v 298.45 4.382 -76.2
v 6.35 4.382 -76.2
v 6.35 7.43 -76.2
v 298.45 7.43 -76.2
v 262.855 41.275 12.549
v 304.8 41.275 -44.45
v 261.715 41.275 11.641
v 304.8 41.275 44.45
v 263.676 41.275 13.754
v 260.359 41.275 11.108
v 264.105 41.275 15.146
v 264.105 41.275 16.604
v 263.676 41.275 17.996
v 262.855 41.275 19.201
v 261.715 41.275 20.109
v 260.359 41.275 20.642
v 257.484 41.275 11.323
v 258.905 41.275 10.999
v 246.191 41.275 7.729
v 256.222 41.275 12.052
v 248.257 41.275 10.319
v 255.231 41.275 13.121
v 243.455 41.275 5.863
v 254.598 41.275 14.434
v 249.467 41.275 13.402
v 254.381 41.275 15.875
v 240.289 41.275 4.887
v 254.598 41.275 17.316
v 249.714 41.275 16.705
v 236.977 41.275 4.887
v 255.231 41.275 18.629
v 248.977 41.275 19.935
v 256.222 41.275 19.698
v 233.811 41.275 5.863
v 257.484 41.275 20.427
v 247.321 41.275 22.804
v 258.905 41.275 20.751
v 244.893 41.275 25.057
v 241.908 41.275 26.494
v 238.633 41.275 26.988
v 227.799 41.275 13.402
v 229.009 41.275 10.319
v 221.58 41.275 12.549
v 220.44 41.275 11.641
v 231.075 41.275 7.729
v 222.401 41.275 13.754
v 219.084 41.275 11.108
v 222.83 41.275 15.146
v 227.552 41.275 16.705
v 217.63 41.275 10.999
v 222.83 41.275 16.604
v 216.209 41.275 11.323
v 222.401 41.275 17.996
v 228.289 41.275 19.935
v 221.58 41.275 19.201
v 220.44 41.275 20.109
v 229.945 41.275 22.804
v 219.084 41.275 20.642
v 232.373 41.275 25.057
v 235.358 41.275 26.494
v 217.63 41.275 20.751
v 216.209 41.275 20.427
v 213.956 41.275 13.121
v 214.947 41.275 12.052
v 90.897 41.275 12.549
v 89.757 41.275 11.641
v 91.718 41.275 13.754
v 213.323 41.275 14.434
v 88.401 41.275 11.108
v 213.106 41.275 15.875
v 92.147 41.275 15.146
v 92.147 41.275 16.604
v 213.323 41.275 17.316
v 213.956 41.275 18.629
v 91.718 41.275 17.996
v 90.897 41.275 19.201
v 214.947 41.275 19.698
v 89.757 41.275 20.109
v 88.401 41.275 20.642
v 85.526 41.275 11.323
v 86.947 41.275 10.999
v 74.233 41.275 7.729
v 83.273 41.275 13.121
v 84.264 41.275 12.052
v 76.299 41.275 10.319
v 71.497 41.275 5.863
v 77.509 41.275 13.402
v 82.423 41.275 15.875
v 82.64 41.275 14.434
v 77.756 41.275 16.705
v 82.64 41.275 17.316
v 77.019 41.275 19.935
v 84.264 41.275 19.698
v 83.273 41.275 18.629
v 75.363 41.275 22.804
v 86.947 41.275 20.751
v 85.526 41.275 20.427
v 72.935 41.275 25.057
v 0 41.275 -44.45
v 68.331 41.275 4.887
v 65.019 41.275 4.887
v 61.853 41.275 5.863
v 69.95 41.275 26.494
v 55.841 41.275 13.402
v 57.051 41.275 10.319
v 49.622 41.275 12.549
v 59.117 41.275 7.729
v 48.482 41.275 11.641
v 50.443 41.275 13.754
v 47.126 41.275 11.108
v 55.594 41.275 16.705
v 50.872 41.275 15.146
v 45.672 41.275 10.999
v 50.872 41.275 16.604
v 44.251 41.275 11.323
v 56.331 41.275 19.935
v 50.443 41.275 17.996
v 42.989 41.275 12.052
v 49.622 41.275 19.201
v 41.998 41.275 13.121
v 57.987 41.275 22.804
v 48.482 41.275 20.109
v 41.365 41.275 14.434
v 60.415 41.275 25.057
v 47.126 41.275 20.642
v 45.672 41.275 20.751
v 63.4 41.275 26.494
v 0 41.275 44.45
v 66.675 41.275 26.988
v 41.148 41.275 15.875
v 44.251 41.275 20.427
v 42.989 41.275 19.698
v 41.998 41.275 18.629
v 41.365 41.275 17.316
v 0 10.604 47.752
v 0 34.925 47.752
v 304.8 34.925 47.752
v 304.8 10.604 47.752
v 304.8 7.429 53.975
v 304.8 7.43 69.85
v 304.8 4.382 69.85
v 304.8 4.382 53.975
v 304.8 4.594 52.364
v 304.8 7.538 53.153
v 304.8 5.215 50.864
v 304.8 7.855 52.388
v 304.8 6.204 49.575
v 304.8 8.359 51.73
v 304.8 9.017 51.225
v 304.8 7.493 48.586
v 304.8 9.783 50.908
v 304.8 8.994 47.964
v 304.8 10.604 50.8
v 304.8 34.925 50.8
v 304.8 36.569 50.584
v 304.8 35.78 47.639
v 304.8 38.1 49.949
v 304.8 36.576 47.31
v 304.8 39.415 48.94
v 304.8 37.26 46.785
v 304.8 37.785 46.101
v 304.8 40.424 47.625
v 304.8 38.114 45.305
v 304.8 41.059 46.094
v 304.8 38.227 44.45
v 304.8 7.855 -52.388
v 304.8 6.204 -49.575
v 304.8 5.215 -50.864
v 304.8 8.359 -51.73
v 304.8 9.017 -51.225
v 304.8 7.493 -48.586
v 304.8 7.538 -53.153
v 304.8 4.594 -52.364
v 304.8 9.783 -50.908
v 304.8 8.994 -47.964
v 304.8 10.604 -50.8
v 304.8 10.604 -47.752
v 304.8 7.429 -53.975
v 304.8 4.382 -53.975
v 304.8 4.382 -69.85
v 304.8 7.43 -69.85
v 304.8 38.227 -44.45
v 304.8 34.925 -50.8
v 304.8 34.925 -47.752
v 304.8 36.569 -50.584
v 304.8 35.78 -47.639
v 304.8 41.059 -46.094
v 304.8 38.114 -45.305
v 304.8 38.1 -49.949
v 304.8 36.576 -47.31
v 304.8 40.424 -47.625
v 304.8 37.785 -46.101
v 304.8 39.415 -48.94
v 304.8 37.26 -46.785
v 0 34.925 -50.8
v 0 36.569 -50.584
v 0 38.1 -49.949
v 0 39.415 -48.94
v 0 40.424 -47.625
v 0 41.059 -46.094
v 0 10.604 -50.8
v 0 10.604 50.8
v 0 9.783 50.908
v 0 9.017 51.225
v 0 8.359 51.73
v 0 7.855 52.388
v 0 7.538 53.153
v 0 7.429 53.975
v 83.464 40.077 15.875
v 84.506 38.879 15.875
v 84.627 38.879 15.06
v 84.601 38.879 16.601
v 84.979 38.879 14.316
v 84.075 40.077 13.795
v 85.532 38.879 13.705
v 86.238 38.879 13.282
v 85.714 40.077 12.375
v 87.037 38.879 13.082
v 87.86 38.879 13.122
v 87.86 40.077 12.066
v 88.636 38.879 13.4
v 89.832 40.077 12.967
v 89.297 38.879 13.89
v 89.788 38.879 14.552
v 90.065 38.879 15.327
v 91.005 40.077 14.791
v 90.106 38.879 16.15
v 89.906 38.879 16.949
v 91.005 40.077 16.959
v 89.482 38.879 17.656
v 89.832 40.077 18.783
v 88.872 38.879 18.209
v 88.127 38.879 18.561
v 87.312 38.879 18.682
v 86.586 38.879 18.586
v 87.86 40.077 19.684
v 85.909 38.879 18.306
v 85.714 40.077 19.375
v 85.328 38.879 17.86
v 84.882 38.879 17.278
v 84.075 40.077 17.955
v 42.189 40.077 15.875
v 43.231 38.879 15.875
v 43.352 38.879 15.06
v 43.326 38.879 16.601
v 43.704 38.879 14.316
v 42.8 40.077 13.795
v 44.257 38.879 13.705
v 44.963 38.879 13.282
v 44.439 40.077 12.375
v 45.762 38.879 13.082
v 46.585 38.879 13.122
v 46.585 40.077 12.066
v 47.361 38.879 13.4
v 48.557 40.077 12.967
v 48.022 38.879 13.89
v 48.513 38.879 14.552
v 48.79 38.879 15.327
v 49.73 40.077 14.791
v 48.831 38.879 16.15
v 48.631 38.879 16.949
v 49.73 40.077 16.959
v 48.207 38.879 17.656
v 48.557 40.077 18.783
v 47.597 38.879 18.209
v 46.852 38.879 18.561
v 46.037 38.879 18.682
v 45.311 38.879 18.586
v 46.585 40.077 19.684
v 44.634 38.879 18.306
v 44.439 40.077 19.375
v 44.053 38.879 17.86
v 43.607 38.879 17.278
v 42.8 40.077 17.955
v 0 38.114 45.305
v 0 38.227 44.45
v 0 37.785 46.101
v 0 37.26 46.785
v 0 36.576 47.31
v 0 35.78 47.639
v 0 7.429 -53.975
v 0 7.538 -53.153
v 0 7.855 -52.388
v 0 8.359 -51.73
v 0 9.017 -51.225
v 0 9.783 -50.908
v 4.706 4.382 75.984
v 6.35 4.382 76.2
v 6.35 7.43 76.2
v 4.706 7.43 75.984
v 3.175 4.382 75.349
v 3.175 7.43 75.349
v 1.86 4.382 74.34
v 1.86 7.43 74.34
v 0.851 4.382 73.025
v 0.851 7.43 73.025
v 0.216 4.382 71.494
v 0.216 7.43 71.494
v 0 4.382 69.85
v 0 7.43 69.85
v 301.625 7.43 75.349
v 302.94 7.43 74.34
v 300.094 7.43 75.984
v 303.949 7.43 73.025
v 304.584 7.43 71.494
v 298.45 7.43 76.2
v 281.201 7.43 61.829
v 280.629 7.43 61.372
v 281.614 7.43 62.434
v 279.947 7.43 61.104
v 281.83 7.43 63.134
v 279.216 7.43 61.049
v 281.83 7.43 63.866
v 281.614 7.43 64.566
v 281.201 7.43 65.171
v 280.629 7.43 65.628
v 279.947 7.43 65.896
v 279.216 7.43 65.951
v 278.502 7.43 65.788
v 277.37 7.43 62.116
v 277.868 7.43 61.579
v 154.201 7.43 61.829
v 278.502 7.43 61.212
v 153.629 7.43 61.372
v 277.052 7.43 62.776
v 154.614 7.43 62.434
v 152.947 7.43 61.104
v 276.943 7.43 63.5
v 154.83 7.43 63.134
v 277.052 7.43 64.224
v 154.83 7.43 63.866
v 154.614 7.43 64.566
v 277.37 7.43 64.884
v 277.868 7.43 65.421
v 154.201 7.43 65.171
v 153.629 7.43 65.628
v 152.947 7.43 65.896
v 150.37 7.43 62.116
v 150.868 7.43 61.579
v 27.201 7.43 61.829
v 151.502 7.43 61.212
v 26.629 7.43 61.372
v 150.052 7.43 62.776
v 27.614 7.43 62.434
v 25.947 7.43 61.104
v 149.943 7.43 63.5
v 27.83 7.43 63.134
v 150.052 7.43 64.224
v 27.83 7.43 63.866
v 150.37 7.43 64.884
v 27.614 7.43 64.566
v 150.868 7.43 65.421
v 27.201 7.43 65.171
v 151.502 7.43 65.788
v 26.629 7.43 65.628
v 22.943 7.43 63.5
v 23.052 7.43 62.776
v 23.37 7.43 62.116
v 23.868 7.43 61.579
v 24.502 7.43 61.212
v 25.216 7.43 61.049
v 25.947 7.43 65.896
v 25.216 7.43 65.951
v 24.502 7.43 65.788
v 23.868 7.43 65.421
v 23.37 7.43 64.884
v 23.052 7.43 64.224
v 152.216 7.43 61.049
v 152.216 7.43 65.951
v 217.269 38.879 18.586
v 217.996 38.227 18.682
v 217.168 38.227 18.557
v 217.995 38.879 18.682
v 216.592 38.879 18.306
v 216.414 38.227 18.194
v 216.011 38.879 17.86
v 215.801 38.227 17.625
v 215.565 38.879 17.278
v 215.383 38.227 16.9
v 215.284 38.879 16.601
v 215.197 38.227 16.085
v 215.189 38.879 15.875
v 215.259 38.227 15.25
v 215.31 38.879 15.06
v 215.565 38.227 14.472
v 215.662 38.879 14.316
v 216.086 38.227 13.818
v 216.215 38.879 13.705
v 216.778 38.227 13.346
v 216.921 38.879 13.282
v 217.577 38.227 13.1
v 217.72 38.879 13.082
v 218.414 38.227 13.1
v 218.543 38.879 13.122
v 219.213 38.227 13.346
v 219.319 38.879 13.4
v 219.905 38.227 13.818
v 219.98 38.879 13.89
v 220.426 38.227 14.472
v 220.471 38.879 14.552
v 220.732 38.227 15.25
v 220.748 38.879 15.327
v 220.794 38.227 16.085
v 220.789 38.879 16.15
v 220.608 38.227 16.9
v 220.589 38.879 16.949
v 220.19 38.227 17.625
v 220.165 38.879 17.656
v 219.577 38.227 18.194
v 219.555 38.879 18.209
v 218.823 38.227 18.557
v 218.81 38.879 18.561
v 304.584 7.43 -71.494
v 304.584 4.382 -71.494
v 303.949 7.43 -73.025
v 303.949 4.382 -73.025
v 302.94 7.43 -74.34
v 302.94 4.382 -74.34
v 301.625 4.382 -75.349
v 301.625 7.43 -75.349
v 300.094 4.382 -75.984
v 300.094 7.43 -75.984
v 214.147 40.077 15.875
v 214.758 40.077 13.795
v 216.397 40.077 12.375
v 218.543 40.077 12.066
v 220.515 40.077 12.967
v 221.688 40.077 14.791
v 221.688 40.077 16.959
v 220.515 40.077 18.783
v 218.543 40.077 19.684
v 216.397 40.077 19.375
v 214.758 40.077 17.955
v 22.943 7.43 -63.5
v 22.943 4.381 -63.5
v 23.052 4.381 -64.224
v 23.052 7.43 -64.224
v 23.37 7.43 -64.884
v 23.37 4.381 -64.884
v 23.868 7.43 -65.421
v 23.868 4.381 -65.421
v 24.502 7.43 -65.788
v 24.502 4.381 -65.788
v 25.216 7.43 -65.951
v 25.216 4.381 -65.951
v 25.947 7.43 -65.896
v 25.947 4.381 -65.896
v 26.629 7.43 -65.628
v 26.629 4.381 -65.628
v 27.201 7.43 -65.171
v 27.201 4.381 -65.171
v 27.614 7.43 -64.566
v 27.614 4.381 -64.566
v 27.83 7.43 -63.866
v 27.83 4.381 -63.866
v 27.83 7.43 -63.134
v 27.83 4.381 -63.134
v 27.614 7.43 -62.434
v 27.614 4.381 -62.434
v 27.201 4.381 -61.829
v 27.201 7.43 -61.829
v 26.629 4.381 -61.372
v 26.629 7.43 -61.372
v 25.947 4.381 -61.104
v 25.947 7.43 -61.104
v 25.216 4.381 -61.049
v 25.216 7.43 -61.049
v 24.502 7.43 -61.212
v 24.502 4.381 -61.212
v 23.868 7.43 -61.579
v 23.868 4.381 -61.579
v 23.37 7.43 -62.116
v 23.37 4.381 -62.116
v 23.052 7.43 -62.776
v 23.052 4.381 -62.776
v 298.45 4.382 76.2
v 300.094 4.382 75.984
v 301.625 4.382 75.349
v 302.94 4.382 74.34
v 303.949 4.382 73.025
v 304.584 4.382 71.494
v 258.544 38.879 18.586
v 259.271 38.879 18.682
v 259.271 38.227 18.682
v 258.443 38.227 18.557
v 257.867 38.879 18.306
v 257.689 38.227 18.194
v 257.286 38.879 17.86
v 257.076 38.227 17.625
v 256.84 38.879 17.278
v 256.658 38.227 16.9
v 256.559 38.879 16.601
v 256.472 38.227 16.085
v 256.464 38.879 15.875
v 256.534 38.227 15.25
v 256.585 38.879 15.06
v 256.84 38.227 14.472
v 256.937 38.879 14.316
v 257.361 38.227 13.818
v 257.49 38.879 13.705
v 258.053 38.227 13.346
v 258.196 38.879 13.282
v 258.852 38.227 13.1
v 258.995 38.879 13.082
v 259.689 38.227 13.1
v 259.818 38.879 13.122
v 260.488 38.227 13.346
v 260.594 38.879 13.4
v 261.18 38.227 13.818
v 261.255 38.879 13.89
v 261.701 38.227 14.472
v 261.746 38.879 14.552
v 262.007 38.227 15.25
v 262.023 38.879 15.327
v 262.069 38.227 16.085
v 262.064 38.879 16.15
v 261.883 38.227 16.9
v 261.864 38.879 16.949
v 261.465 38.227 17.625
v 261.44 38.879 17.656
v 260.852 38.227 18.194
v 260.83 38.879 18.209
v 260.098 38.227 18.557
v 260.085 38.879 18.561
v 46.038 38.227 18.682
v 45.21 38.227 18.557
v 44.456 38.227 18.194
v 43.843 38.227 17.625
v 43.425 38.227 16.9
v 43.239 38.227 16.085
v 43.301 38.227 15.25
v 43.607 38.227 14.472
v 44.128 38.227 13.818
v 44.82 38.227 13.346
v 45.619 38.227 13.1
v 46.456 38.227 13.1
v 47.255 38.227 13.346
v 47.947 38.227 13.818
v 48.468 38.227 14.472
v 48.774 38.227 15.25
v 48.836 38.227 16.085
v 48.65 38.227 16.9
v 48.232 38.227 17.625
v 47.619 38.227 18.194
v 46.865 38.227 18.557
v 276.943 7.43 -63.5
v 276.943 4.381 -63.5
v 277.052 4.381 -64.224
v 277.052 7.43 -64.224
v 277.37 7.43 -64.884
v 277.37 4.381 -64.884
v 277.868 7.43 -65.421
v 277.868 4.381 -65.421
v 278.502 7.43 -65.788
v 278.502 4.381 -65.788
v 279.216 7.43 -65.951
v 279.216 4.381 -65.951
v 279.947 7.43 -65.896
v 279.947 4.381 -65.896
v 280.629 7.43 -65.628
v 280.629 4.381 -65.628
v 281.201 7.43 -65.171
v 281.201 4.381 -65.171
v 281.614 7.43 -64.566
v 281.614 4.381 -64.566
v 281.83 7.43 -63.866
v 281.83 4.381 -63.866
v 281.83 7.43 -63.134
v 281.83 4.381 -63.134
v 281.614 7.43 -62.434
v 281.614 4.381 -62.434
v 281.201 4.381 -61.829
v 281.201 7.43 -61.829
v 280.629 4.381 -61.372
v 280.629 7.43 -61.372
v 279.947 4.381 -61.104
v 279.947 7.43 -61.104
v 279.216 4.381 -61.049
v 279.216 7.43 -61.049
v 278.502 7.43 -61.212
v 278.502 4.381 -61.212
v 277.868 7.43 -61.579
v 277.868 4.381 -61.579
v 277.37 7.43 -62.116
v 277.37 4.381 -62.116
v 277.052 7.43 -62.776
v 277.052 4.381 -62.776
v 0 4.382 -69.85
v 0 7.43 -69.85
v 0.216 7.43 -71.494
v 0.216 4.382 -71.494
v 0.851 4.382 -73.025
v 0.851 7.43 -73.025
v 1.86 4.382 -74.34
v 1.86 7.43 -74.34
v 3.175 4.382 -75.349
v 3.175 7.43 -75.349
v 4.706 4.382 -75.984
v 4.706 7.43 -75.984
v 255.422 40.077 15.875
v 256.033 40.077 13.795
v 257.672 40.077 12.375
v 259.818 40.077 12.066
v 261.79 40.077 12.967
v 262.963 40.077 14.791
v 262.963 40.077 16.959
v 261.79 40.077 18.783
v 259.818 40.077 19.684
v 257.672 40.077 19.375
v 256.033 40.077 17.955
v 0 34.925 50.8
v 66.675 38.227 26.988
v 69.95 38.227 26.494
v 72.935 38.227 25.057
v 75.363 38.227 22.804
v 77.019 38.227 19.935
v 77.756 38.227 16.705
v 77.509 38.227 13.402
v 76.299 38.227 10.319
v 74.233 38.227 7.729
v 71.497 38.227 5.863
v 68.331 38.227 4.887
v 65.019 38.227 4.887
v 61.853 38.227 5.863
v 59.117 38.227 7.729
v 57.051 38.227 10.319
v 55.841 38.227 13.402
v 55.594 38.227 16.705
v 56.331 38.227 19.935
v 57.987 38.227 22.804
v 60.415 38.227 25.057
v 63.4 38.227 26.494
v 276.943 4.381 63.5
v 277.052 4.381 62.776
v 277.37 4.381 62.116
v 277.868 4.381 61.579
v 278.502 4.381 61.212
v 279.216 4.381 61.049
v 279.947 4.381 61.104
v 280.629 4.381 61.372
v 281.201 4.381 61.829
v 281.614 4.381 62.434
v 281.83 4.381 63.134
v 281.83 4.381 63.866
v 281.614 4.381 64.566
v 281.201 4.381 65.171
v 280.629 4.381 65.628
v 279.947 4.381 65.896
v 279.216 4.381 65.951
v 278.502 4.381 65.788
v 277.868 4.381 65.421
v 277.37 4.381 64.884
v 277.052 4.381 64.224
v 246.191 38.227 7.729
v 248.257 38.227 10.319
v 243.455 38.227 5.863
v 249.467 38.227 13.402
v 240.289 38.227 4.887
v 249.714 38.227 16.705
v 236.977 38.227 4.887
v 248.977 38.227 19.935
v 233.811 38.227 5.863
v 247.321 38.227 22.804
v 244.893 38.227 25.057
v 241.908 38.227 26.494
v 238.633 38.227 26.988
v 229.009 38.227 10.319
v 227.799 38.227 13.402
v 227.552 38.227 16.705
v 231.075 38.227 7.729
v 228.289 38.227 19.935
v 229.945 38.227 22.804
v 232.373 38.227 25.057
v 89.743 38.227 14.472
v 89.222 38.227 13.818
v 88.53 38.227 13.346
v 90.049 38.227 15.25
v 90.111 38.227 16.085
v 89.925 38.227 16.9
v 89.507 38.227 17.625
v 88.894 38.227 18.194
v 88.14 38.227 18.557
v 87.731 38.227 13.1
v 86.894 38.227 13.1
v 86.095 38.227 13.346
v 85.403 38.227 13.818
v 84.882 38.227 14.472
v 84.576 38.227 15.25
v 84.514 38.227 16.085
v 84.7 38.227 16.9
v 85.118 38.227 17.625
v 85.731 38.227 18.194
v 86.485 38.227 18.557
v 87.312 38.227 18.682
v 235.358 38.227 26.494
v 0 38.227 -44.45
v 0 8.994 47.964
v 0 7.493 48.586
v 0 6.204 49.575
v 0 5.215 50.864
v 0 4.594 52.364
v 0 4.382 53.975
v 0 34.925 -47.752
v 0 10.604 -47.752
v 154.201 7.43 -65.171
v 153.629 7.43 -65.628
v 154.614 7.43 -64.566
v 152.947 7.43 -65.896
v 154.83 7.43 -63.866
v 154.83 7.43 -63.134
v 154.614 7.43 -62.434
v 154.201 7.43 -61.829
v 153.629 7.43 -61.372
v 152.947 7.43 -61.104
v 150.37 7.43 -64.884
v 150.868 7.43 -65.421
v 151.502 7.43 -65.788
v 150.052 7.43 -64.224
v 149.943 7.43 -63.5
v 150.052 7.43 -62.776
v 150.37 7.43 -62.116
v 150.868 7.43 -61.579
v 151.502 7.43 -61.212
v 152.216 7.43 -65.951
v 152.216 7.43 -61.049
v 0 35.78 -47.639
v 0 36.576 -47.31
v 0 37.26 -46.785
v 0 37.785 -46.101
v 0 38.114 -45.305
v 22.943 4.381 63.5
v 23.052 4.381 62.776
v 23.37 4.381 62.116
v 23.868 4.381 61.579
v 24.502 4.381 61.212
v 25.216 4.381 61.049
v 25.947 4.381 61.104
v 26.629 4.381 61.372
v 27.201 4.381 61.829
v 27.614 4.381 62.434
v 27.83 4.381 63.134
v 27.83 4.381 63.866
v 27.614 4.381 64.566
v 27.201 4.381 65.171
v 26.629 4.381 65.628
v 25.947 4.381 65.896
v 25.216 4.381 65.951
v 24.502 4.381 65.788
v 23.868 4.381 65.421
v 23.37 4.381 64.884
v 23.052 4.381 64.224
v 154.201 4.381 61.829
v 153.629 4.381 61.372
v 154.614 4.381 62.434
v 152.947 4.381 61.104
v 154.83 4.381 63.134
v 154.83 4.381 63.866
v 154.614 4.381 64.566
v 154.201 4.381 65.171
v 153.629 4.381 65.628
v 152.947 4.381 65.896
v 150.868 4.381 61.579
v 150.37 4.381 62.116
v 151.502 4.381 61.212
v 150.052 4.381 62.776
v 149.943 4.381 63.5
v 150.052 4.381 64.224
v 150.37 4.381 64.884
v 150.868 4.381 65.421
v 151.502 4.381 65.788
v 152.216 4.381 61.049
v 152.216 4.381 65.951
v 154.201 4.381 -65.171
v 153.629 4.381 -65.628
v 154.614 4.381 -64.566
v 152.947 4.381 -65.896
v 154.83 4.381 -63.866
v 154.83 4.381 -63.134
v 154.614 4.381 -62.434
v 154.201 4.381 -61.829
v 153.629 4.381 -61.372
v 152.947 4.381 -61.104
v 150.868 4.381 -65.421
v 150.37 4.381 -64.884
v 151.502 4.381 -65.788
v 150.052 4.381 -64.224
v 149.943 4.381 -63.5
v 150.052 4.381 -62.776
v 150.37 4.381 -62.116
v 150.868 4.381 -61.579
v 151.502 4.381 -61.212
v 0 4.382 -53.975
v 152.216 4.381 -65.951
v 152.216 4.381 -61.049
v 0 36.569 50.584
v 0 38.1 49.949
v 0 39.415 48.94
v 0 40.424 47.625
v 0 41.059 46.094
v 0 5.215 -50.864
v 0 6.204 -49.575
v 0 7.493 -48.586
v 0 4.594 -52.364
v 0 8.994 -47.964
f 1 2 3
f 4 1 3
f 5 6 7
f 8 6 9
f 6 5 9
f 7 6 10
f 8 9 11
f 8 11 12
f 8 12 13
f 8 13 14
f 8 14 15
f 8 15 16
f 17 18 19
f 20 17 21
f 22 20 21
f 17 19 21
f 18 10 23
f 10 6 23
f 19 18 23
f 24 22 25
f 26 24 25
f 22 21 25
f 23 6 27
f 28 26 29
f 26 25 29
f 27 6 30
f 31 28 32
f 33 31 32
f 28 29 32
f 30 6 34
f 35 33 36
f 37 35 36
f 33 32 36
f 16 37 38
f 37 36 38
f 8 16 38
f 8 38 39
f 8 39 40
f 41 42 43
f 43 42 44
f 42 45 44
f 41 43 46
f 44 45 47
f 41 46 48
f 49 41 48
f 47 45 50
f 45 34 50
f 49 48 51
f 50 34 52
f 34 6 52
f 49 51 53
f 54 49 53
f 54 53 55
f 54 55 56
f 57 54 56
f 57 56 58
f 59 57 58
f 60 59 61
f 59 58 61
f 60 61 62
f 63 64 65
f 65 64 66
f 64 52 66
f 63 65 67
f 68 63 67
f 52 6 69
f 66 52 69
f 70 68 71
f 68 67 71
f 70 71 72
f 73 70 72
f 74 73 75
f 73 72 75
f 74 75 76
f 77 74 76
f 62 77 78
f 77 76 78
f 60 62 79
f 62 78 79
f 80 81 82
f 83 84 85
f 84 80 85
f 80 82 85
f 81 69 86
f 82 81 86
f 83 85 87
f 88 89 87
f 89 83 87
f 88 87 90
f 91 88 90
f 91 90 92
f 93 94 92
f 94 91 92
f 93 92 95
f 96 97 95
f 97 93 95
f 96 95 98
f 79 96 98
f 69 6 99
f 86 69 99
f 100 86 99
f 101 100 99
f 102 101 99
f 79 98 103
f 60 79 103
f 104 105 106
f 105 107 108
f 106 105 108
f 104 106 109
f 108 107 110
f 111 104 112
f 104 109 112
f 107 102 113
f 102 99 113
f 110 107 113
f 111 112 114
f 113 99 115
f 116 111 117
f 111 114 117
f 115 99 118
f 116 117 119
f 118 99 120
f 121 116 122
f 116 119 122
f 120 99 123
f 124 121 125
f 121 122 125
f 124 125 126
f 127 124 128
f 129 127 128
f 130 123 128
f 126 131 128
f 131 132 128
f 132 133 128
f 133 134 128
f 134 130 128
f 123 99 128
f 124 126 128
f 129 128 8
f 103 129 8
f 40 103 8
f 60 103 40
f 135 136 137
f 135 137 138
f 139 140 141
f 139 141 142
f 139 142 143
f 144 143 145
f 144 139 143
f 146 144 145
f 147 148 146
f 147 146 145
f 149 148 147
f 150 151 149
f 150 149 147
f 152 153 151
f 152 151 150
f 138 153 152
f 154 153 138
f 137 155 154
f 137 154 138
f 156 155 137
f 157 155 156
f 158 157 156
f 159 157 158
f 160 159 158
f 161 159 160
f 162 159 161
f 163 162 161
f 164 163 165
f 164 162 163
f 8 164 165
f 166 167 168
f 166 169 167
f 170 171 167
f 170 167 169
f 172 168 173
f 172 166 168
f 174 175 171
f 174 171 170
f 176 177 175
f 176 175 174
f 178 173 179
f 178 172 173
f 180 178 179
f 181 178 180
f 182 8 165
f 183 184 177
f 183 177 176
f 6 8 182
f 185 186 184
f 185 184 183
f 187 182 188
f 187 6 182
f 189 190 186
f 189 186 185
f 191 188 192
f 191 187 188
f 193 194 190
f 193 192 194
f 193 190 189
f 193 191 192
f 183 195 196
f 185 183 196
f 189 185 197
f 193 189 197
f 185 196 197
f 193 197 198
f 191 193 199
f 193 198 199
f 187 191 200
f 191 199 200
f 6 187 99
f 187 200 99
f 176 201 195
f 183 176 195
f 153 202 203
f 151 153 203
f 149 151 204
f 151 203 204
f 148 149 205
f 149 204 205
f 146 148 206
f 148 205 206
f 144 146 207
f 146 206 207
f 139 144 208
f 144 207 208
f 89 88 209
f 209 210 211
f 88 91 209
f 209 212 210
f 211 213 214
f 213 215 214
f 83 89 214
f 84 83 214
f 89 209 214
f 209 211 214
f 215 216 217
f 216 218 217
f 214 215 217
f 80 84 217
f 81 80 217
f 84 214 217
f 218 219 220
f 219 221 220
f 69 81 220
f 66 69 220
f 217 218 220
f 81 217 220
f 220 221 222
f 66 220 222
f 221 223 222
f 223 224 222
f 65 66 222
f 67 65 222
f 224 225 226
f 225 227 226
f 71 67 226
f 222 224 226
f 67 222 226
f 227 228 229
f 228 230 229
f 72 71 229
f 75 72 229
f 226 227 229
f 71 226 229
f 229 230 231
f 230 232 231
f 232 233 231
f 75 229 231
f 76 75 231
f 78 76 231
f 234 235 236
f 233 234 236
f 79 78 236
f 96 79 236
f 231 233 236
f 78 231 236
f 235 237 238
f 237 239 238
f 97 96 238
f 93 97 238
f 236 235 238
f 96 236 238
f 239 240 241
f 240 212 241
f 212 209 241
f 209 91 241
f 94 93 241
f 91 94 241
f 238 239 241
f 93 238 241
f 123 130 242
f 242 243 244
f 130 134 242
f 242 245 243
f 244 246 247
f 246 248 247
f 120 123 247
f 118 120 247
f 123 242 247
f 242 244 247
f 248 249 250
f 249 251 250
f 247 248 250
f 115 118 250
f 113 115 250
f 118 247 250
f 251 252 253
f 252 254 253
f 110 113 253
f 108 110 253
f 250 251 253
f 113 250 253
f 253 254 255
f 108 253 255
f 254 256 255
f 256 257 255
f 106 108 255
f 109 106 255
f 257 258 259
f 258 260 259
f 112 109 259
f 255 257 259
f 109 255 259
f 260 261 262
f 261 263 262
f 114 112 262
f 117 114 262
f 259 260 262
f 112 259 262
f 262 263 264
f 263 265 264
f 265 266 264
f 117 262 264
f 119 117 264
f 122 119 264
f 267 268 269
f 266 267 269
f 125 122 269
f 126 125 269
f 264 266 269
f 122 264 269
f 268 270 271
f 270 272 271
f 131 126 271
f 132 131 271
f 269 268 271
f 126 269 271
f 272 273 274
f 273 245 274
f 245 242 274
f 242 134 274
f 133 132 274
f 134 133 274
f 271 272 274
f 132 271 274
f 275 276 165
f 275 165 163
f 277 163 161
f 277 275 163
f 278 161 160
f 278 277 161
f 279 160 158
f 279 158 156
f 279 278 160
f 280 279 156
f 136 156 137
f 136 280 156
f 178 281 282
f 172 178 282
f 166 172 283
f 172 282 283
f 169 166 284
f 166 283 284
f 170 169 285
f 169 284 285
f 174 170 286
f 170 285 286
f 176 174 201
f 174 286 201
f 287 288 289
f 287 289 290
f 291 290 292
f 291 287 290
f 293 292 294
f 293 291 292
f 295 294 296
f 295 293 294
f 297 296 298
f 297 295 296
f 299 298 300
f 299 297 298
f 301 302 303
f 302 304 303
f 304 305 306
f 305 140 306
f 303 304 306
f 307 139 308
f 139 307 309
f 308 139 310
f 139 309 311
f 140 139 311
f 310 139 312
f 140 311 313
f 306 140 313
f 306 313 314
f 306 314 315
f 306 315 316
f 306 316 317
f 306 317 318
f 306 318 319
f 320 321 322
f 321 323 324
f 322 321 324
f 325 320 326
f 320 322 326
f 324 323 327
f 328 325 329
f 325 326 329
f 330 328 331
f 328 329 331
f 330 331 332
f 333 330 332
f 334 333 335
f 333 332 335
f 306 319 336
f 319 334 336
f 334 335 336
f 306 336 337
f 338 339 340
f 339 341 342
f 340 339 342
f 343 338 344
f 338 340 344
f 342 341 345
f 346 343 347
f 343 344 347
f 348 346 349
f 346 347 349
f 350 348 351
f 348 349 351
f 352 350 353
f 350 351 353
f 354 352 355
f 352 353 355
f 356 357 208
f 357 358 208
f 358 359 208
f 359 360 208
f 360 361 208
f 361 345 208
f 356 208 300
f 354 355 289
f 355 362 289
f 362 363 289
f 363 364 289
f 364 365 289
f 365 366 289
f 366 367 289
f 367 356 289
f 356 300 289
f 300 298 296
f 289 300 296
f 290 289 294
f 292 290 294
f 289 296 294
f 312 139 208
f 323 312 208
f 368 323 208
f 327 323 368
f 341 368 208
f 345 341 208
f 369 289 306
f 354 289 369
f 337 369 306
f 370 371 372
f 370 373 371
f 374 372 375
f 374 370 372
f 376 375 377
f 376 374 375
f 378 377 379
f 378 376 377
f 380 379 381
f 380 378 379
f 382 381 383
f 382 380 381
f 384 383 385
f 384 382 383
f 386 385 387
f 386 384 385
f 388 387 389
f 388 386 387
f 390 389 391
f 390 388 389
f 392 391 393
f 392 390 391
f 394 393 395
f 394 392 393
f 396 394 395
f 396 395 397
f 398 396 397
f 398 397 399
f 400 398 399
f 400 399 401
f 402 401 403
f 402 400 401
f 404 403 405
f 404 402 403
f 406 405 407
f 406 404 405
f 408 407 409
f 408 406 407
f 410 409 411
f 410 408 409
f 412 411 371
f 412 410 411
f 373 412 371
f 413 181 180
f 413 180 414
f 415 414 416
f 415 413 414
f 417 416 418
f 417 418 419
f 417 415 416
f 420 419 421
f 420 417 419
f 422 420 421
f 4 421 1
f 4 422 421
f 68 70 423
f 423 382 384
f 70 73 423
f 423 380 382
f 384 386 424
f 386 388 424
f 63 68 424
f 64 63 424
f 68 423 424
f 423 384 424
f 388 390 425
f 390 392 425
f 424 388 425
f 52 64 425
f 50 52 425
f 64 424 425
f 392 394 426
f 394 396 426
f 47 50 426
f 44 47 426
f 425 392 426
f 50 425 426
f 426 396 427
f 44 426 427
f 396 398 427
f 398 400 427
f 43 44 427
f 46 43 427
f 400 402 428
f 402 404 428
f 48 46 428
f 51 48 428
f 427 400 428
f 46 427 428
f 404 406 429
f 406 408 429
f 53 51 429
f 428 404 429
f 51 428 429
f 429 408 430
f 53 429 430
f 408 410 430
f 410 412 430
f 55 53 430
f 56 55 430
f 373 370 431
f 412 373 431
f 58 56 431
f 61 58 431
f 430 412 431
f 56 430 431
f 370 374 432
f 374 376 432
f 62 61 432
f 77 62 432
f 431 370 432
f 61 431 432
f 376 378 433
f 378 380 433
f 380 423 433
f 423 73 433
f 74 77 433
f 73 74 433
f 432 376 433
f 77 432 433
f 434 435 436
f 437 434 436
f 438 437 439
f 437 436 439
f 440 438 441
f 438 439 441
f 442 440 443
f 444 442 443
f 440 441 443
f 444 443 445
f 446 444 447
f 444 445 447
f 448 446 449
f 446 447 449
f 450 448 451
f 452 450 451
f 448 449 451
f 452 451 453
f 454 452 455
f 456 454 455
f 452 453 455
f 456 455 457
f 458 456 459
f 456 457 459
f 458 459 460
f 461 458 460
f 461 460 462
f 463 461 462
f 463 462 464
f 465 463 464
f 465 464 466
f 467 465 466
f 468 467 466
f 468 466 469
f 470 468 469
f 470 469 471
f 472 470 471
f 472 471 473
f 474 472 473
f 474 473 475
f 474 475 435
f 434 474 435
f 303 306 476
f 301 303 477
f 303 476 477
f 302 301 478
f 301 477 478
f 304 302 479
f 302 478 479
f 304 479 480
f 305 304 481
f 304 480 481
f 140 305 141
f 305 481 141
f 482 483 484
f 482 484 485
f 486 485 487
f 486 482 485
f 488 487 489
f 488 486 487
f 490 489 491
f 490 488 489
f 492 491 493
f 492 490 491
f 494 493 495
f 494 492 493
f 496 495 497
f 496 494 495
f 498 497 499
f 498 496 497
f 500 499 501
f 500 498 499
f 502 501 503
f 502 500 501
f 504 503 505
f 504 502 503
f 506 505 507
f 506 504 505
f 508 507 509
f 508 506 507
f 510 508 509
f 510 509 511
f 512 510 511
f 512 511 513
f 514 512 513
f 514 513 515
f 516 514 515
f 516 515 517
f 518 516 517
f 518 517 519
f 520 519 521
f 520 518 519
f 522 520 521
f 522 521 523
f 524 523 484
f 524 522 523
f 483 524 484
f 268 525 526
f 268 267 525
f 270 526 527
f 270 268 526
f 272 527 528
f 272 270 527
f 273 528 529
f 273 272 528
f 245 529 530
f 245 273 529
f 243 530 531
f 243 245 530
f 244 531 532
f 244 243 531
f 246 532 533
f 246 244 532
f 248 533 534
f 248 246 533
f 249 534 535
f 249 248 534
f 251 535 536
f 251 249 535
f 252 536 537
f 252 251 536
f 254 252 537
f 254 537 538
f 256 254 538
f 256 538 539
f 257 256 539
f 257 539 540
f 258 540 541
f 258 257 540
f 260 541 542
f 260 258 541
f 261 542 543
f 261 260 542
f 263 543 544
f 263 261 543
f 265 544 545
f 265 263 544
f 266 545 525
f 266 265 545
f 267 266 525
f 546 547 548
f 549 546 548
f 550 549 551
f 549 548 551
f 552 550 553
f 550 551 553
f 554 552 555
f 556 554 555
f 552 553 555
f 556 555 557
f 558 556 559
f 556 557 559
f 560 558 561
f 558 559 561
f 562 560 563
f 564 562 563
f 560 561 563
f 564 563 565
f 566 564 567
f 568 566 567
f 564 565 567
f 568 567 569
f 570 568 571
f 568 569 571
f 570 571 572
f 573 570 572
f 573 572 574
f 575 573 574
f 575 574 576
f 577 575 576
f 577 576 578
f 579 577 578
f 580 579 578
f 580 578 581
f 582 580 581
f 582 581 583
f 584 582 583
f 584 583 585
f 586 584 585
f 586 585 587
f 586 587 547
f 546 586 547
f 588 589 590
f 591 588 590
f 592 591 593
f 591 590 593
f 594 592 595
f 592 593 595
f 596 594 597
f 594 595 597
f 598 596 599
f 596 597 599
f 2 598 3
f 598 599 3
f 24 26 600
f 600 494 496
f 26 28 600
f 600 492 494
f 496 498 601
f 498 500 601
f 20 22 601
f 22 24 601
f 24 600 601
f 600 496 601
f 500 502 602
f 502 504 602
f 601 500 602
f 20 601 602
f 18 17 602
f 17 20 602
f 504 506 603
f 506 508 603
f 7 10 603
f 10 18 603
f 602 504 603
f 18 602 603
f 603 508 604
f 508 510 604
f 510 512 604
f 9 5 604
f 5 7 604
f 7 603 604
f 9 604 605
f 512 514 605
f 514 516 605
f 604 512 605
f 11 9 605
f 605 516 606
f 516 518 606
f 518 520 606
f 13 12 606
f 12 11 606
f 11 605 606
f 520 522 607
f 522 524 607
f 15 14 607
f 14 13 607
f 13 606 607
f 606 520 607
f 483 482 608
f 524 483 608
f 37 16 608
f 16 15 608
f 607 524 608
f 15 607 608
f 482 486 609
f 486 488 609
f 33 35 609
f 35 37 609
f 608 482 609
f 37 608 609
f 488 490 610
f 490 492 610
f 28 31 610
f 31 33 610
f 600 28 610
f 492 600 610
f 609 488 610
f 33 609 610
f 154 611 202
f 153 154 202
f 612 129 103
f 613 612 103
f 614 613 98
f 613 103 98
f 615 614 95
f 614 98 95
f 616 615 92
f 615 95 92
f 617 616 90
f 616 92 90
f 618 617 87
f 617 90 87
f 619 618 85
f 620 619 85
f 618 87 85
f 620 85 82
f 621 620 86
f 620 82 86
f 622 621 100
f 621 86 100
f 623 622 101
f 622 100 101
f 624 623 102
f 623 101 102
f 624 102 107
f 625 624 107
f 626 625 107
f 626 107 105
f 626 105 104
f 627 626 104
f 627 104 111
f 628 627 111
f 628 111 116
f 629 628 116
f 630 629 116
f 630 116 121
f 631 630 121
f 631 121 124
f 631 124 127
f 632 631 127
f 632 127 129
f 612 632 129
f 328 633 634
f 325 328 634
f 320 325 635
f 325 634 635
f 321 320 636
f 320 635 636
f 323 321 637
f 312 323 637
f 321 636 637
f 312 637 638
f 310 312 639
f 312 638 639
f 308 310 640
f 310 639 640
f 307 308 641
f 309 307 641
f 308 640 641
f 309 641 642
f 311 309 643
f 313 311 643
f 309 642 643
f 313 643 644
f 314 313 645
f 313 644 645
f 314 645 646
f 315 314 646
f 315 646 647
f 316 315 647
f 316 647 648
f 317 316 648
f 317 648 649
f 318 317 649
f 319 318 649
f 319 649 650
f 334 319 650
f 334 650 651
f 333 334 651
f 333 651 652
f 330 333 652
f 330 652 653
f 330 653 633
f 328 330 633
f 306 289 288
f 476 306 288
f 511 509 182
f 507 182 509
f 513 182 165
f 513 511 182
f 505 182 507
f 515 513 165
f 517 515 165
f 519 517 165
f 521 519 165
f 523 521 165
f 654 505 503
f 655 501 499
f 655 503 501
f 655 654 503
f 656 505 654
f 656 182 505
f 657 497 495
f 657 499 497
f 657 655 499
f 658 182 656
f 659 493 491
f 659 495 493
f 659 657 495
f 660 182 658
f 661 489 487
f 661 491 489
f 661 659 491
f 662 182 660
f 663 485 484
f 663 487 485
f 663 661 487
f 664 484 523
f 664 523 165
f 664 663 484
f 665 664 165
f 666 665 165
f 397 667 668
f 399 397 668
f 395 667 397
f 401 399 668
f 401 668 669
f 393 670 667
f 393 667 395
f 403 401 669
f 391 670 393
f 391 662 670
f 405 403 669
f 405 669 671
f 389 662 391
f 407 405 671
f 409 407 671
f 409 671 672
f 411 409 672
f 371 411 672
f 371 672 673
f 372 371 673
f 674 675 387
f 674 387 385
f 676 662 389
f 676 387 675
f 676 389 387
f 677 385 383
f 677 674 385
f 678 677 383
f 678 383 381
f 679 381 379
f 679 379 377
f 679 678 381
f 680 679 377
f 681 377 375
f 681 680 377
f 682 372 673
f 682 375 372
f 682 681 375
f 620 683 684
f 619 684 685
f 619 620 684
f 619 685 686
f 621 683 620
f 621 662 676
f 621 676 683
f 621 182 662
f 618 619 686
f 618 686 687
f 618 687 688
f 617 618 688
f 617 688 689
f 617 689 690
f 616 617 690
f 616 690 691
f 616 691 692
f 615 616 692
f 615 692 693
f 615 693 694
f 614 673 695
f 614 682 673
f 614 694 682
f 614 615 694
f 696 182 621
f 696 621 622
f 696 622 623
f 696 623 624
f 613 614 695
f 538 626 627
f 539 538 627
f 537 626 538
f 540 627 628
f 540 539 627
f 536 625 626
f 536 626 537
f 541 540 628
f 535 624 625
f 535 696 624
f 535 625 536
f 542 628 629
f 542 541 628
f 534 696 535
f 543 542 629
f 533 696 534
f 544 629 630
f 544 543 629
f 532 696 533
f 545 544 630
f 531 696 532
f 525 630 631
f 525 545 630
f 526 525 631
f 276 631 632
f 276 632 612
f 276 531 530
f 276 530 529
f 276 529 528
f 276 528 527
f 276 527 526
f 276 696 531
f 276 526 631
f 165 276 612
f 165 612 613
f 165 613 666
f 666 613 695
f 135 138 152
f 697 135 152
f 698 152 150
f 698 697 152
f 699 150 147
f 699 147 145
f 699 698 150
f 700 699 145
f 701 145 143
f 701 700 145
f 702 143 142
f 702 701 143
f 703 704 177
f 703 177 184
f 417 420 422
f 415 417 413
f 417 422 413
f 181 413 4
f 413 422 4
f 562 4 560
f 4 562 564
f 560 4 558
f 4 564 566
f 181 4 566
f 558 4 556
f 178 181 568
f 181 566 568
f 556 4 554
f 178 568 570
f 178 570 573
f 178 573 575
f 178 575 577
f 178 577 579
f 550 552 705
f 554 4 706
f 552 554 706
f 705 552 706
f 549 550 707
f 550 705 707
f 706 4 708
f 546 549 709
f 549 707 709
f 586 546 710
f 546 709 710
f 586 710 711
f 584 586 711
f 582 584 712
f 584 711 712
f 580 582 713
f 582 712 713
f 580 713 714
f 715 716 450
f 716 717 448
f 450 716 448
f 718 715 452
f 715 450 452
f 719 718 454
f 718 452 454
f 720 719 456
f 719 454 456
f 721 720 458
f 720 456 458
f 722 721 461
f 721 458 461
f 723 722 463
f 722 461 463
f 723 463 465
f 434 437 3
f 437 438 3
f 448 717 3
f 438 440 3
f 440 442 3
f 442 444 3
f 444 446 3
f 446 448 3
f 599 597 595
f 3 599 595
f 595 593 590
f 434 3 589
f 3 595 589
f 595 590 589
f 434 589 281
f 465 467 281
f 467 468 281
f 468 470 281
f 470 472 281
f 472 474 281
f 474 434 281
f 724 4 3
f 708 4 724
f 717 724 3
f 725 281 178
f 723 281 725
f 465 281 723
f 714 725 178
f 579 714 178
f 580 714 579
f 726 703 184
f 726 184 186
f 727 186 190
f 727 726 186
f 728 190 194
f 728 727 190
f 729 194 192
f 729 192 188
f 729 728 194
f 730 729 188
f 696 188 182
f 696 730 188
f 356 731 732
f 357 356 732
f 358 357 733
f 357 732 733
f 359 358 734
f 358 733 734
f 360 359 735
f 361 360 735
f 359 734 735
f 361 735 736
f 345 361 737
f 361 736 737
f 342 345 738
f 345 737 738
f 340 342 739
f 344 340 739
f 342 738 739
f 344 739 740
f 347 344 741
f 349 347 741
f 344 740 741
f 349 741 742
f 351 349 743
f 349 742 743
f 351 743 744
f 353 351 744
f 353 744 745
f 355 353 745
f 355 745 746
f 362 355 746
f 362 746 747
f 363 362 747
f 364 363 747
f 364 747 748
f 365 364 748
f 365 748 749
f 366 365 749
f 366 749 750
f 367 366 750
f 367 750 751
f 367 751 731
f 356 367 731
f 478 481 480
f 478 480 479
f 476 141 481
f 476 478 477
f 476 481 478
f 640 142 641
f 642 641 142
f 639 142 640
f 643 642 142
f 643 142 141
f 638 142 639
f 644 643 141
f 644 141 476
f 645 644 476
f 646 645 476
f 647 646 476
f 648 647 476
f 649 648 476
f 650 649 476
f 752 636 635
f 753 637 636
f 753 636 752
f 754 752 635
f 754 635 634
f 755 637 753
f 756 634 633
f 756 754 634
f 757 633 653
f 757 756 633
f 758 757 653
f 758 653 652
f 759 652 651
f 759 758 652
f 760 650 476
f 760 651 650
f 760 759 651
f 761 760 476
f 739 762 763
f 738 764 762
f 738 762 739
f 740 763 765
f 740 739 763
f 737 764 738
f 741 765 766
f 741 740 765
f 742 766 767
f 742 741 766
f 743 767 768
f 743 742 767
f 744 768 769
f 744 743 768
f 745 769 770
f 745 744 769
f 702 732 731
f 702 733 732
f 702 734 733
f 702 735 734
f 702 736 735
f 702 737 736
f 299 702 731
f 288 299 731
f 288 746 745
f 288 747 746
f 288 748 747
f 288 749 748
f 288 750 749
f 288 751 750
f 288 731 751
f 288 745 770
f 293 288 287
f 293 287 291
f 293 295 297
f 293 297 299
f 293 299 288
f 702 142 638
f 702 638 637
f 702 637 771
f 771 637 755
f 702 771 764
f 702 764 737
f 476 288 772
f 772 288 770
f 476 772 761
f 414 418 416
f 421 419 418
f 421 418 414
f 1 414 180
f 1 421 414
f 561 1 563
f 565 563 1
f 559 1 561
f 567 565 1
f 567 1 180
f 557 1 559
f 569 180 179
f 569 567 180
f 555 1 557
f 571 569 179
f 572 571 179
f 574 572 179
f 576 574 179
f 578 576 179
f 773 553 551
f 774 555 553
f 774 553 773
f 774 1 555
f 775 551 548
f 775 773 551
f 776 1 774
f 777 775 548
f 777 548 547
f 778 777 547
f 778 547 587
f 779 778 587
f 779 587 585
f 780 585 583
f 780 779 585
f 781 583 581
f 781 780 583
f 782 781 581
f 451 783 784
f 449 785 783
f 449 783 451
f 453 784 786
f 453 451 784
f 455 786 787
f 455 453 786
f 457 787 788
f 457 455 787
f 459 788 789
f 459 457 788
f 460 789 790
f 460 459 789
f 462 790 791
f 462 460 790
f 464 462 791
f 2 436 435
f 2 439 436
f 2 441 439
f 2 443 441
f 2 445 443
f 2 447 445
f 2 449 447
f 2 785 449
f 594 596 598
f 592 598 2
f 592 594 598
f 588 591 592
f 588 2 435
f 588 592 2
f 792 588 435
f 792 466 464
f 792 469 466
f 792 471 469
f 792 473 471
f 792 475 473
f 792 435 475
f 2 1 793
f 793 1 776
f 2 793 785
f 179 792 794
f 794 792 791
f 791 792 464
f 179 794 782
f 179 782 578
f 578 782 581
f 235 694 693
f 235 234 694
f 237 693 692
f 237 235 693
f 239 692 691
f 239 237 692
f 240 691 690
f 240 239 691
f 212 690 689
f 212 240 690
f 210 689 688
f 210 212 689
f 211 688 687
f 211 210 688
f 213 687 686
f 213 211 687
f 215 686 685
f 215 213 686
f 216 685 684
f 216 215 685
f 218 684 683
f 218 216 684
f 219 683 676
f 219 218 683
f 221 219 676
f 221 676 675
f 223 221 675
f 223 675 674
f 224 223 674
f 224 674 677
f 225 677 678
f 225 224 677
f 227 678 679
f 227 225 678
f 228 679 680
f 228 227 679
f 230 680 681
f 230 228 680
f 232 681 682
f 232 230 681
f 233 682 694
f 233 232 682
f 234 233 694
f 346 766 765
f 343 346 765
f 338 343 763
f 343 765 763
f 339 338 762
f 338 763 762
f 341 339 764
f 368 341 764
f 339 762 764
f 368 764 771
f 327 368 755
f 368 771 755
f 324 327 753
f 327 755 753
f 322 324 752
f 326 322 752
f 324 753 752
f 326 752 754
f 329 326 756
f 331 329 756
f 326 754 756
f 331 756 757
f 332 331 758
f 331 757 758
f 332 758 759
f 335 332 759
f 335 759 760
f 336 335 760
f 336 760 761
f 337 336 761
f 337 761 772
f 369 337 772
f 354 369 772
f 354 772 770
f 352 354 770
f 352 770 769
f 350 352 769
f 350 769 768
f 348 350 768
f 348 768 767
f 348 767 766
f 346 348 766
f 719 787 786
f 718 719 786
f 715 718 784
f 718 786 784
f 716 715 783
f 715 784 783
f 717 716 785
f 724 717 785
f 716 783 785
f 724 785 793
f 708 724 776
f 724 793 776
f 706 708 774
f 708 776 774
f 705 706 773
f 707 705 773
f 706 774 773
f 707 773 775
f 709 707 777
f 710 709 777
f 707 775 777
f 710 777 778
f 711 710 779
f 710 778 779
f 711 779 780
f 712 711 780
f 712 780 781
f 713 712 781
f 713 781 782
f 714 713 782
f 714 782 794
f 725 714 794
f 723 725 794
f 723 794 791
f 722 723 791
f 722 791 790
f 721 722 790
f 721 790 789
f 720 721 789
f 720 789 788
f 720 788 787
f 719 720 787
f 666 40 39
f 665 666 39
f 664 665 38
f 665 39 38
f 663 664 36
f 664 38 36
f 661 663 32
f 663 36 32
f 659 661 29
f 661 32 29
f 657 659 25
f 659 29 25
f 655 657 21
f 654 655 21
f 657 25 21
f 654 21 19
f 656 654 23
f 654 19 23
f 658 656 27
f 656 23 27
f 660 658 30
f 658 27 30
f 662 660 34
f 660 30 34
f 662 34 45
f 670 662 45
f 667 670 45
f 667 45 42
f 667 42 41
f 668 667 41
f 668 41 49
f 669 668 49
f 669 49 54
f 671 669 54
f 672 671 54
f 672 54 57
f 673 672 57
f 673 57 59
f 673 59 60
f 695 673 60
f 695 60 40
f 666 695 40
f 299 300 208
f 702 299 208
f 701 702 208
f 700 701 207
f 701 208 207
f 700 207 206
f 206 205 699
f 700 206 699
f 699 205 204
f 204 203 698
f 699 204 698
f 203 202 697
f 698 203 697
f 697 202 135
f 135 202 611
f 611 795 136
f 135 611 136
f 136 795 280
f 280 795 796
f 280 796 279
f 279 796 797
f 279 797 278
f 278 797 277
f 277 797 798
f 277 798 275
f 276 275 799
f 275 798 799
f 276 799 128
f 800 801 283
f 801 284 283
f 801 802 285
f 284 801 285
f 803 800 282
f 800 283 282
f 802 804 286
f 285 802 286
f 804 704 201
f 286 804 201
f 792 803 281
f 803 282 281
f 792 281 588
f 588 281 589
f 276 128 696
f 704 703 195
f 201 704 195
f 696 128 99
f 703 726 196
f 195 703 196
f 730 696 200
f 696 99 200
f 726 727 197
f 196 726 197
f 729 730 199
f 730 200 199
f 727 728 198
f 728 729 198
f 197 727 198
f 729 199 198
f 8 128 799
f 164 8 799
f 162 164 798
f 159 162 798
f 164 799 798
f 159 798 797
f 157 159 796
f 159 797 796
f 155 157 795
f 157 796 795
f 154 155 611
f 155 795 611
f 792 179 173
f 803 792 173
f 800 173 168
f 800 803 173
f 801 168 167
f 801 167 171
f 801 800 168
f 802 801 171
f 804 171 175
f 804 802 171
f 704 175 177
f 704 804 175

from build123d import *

# Parameters (mm, degrees)
BOSS_EXTRUDE1_DEPTH                                = 304.8
SKETCH2_R                                          = 2.3876
CUT_EXTRUDE1_DEPTH                                 = 317.354227758
SKETCH3_R                                          = 11.1125
CUT_EXTRUDE2_DEPTH                                 = 304.8
CSK_FOR_10_FLAT_HEAD_MACHINE_SCREW1_AT_COUNT       = 2
CSK_FOR_10_FLAT_HEAD_MACHINE_SCREW1_AT_PITCH       = 41.275
LPATTERN1_COUNT                                    = 2
LPATTERN1_PITCH                                    = 171.958
FILLET1_R                                          = 6.35
SKETCH14_R                                         = 4.8895
SKETCH14_R_2                                       = 2.8067
BOSS_EXTRUDE2_DEPTH                                = 3.175
CONVERT_SOLID1_DEPTH                               = 304.8
F_10_0_1935_DIAMETER_HOLE1_D                       = 4.9149
F_10_0_1935_DIAMETER_HOLE1_DEPTH                   = 3.048
CSK_FOR_10_FLAT_HEAD_MACHINE_SCREW_100_D           = 5.6134
CSK_FOR_10_FLAT_HEAD_MACHINE_SCREW_100_DEPTH       = 36.8935
CSK_FOR_10_FLAT_HEAD_MACHINE_SCREW_100_CSINK_D     = 9.779
CSK_FOR_10_FLAT_HEAD_MACHINE_SCREW_100_CSINK_ANGLE = 82


# Read off the part's stored shape, not the designer's step: Convert-Solid1
with BuildPart() as part:
    # Sketch1 → Boss-Extrude1 (new body)
    with BuildSketch(Plane(origin=(0, 0, 0), x_dir=(0, 0, -1), z_dir=(1, 0, 0))):
        with BuildLine():
            Line((-76.2, 4.2545), (-53.975, 4.2545))
            ThreePointArc((-53.975, 4.2545), (-49.484871939, 6.114371939), (-47.625, 10.6045))
            Line((-47.625, 10.6045), (-47.625, 34.925))
            ThreePointArc((-47.625, 34.925), (-46.69506403, 37.17006403), (-44.45, 38.1))
            Line((-44.45, 38.1), (44.45, 38.1))
            ThreePointArc((44.45, 38.1), (46.69506403, 37.17006403), (47.625, 34.925))
            Line((47.625, 34.925), (47.625, 10.6045))
            ThreePointArc((47.625, 10.6045), (49.484871939, 6.114371939), (53.975, 4.2545))
            Line((53.975, 4.2545), (76.2, 4.2545))
            Line((76.2, 4.2545), (76.2, 7.4295))
            Line((76.2, 7.4295), (53.975, 7.4295))
            ThreePointArc((53.975, 7.4295), (51.72993597, 8.35943597), (50.8, 10.6045))
            Line((50.8, 10.6045), (50.8, 34.925))
            ThreePointArc((50.8, 34.925), (48.940128061, 39.415128061), (44.45, 41.275))
            Line((44.45, 41.275), (-44.45, 41.275))
            ThreePointArc((-44.45, 41.275), (-48.940128061, 39.415128061), (-50.8, 34.925))
            Line((-50.8, 34.925), (-50.8, 10.6045))
            ThreePointArc((-50.8, 10.6045), (-51.72993597, 8.35943597), (-53.975, 7.4295))
            Line((-53.975, 7.4295), (-76.2, 7.4295))
            Line((-76.2, 7.4295), (-76.2, 4.2545))
        make_face()
    extrude(amount=BOSS_EXTRUDE1_DEPTH)

    # Sketch2 → Cut-Extrude1 (cut, through all)
    with BuildSketch(Plane.XZ.offset(-4.2545)):
        with Locations(Location((25.4, 63.5, 0), (0, 0, 270))):
            Circle(SKETCH2_R)
        with Locations(Location((152.4, 63.5, 0), (0, 0, 270))):
            Circle(SKETCH2_R)
        with Locations(Location((279.4, 63.5, 0), (0, 0, 270))):
            Circle(SKETCH2_R)
    cut_extrude1 = extrude(amount=-CUT_EXTRUDE1_DEPTH, mode=Mode.SUBTRACT)

    # Mirror1: Cut-Extrude1 across plane
    add(cut_extrude1.mirror(Plane.XY), mode=Mode.SUBTRACT)

    # Sketch3 → Cut-Extrude2 (cut)
    with BuildSketch(Plane(origin=(0, 41.275, 0), x_dir=(1, 0, 0), z_dir=(0, 1, 0))):
        with Locations(Location((66.675, -15.875, 0), (0, 0, 270))):
            Circle(SKETCH3_R)
    cut_extrude2 = extrude(amount=-CUT_EXTRUDE2_DEPTH, mode=Mode.SUBTRACT)

    # Sketch5 → CSK for #10 Flat Head Machine Screw1 (revolve, cut)
    with BuildSketch(Plane(origin=(46.0375, 41.275, 15.875), x_dir=(0, 0, 1), z_dir=(1, 0, 0))):
        Polygon((0, 0), (0, 3.175), (2.8067, 3.175), (2.8067, 2.395987319), (4.8895, 0), align=None)
    csk_for_10_flat_head_machine_screw1 = revolve(axis=Axis((46.0375, 47.625, 15.875), (0, -1, 0)), mode=Mode.SUBTRACT)

    # CSK for #10 Flat Head Machine Screw1 at: CSK for #10 Flat Head Machine Screw1 ×2
    with Locations(*[(i * CSK_FOR_10_FLAT_HEAD_MACHINE_SCREW1_AT_PITCH, 0, 0) for i in range(1, CSK_FOR_10_FLAT_HEAD_MACHINE_SCREW1_AT_COUNT)]):
        add(csk_for_10_flat_head_machine_screw1, mode=Mode.SUBTRACT)

    # LPattern1: Cut-Extrude2, CSK for #10 Flat Head Machine Screw1 ×2
    with Locations(*[(i * LPATTERN1_PITCH, 0, 0) for i in range(1, LPATTERN1_COUNT)]):
        add(cut_extrude2, mode=Mode.SUBTRACT)
        add(csk_for_10_flat_head_machine_screw1, mode=Mode.SUBTRACT)

    # LPattern1 copy 1 sketch → LPattern1 copy 1 (revolve, cut)
    with BuildSketch(Plane(origin=(259.2705, 41.275, 15.875), x_dir=(0, 0, 1), z_dir=(1, 0, 0))):
        Polygon((0, 0), (0, 3.175), (2.8067, 3.175), (2.8067, 2.395987319), (4.8895, 0), align=None)
    revolve(axis=Axis((259.2705, 47.625, 15.875), (0, -1, 0)), mode=Mode.SUBTRACT)

    # Fillet1
    fillet1_edges = [part.edges().sort_by_distance(p)[0] for p in [
        (0, 5.842, -76.2),
        (0, 5.842, 76.2),
        (304.8, 5.842, -76.2),
        (304.8, 5.842, 76.2),
    ]]
    fillet(fillet1_edges, radius=FILLET1_R)

    # Sketch14 → Boss-Extrude2 (add)
    # profile 1 of 4: a face of its own
    with BuildSketch(Plane(origin=(0, 41.275, 0), x_dir=(1, 0, 0), z_dir=(0, 1, 0))):
        with Locations((259.2705, -15.875)):
            Circle(SKETCH14_R)
        with Locations(Location((259.2705, -15.875, 0), (0, 0, 270))):
            Circle(SKETCH14_R_2, mode=Mode.SUBTRACT)
    # profile 2 of 4: a face of its own
    with BuildSketch(Plane(origin=(0, 41.275, 0), x_dir=(1, 0, 0), z_dir=(0, 1, 0))):
        with Locations((87.3125, -15.875)):
            Circle(SKETCH14_R)
        with Locations(Location((87.3125, -15.875, 0), (0, 0, 270))):
            Circle(SKETCH14_R_2, mode=Mode.SUBTRACT)
    # profile 3 of 4: a face of its own
    with BuildSketch(Plane(origin=(0, 41.275, 0), x_dir=(1, 0, 0), z_dir=(0, 1, 0))):
        with Locations((217.9955, -15.875)):
            Circle(SKETCH14_R)
        with Locations(Location((217.9955, -15.875, 0), (0, 0, 270))):
            Circle(SKETCH14_R_2, mode=Mode.SUBTRACT)
    # profile 4 of 4: a face of its own
    with BuildSketch(Plane(origin=(0, 41.275, 0), x_dir=(1, 0, 0), z_dir=(0, 1, 0))):
        with Locations((46.0375, -15.875)):
            Circle(SKETCH14_R)
        with Locations(Location((46.0375, -15.875, 0), (0, 0, 270))):
            Circle(SKETCH14_R_2, mode=Mode.SUBTRACT)
    extrude(amount=-BOSS_EXTRUDE2_DEPTH)

    # Convert-Solid1 outline → Convert-Solid1 (cut)
    with BuildSketch(Plane.YZ):
        with BuildLine():
            Line((4.3815, -76.2), (4.3815, -53.975))
            ThreePointArc((4.3815, -53.975), (6.204174501, -49.574674501), (10.6045, -47.752))
            Line((10.6045, -47.752), (34.925, -47.752))
            ThreePointArc((34.925, -47.752), (37.259866591, -46.784866591), (38.227, -44.45))
            Line((38.227, -44.45), (38.227, 44.45))
            ThreePointArc((38.227, 44.45), (37.259866591, 46.784866591), (34.925, 47.752))
            Line((34.925, 47.752), (10.6045, 47.752))
            ThreePointArc((10.6045, 47.752), (6.204174501, 49.574674501), (4.3815, 53.975))
            Line((4.3815, 53.975), (4.3815, 76.2))
            Line((4.3815, 76.2), (4.2545, 76.2))
            Line((4.2545, 76.2), (4.2545, 53.975))
            ThreePointArc((4.2545, 53.975), (6.114371939, 49.484871939), (10.6045, 47.625))
            Line((10.6045, 47.625), (34.925, 47.625))
            ThreePointArc((34.925, 47.625), (37.17006403, 46.69506403), (38.1, 44.45))
            Line((38.1, 44.45), (38.1, -44.45))
            ThreePointArc((38.1, -44.45), (37.17006403, -46.69506403), (34.925, -47.625))
            Line((34.925, -47.625), (10.6045, -47.625))
            ThreePointArc((10.6045, -47.625), (6.114371939, -49.484871939), (4.2545, -53.975))
            Line((4.2545, -53.975), (4.2545, -76.2))
            Line((4.2545, -76.2), (4.3815, -76.2))
        make_face()
    extrude(amount=CONVERT_SOLID1_DEPTH, mode=Mode.SUBTRACT)

    # #10 (0.1935) Diameter Hole1
    with Locations(Plane(origin=(0, 7.4295, 0), x_dir=(1, 0, 0), z_dir=(0, 1, 0))):
        with Locations((25.4, 63.5), (152.4, 63.5), (279.4, 63.5), (279.4, -63.5), (152.4, -63.5), (25.4, -63.5)):
            Hole(F_10_0_1935_DIAMETER_HOLE1_D / 2, depth=F_10_0_1935_DIAMETER_HOLE1_DEPTH)

    # CSK for #10 Flat Head Machine Screw (100)1
    with Locations(Plane(origin=(0, 41.275, 0), x_dir=(1, 0, 0), z_dir=(0, 1, 0))):
        with Locations((46.0375, -15.875), (87.3125, -15.875), (217.9955, -15.875), (259.2705, -15.875)):
            CounterSinkHole(CSK_FOR_10_FLAT_HEAD_MACHINE_SCREW_100_D / 2, CSK_FOR_10_FLAT_HEAD_MACHINE_SCREW_100_CSINK_D / 2, depth=CSK_FOR_10_FLAT_HEAD_MACHINE_SCREW_100_DEPTH, counter_sink_angle=CSK_FOR_10_FLAT_HEAD_MACHINE_SCREW_100_CSINK_ANGLE)


solid = part.part
